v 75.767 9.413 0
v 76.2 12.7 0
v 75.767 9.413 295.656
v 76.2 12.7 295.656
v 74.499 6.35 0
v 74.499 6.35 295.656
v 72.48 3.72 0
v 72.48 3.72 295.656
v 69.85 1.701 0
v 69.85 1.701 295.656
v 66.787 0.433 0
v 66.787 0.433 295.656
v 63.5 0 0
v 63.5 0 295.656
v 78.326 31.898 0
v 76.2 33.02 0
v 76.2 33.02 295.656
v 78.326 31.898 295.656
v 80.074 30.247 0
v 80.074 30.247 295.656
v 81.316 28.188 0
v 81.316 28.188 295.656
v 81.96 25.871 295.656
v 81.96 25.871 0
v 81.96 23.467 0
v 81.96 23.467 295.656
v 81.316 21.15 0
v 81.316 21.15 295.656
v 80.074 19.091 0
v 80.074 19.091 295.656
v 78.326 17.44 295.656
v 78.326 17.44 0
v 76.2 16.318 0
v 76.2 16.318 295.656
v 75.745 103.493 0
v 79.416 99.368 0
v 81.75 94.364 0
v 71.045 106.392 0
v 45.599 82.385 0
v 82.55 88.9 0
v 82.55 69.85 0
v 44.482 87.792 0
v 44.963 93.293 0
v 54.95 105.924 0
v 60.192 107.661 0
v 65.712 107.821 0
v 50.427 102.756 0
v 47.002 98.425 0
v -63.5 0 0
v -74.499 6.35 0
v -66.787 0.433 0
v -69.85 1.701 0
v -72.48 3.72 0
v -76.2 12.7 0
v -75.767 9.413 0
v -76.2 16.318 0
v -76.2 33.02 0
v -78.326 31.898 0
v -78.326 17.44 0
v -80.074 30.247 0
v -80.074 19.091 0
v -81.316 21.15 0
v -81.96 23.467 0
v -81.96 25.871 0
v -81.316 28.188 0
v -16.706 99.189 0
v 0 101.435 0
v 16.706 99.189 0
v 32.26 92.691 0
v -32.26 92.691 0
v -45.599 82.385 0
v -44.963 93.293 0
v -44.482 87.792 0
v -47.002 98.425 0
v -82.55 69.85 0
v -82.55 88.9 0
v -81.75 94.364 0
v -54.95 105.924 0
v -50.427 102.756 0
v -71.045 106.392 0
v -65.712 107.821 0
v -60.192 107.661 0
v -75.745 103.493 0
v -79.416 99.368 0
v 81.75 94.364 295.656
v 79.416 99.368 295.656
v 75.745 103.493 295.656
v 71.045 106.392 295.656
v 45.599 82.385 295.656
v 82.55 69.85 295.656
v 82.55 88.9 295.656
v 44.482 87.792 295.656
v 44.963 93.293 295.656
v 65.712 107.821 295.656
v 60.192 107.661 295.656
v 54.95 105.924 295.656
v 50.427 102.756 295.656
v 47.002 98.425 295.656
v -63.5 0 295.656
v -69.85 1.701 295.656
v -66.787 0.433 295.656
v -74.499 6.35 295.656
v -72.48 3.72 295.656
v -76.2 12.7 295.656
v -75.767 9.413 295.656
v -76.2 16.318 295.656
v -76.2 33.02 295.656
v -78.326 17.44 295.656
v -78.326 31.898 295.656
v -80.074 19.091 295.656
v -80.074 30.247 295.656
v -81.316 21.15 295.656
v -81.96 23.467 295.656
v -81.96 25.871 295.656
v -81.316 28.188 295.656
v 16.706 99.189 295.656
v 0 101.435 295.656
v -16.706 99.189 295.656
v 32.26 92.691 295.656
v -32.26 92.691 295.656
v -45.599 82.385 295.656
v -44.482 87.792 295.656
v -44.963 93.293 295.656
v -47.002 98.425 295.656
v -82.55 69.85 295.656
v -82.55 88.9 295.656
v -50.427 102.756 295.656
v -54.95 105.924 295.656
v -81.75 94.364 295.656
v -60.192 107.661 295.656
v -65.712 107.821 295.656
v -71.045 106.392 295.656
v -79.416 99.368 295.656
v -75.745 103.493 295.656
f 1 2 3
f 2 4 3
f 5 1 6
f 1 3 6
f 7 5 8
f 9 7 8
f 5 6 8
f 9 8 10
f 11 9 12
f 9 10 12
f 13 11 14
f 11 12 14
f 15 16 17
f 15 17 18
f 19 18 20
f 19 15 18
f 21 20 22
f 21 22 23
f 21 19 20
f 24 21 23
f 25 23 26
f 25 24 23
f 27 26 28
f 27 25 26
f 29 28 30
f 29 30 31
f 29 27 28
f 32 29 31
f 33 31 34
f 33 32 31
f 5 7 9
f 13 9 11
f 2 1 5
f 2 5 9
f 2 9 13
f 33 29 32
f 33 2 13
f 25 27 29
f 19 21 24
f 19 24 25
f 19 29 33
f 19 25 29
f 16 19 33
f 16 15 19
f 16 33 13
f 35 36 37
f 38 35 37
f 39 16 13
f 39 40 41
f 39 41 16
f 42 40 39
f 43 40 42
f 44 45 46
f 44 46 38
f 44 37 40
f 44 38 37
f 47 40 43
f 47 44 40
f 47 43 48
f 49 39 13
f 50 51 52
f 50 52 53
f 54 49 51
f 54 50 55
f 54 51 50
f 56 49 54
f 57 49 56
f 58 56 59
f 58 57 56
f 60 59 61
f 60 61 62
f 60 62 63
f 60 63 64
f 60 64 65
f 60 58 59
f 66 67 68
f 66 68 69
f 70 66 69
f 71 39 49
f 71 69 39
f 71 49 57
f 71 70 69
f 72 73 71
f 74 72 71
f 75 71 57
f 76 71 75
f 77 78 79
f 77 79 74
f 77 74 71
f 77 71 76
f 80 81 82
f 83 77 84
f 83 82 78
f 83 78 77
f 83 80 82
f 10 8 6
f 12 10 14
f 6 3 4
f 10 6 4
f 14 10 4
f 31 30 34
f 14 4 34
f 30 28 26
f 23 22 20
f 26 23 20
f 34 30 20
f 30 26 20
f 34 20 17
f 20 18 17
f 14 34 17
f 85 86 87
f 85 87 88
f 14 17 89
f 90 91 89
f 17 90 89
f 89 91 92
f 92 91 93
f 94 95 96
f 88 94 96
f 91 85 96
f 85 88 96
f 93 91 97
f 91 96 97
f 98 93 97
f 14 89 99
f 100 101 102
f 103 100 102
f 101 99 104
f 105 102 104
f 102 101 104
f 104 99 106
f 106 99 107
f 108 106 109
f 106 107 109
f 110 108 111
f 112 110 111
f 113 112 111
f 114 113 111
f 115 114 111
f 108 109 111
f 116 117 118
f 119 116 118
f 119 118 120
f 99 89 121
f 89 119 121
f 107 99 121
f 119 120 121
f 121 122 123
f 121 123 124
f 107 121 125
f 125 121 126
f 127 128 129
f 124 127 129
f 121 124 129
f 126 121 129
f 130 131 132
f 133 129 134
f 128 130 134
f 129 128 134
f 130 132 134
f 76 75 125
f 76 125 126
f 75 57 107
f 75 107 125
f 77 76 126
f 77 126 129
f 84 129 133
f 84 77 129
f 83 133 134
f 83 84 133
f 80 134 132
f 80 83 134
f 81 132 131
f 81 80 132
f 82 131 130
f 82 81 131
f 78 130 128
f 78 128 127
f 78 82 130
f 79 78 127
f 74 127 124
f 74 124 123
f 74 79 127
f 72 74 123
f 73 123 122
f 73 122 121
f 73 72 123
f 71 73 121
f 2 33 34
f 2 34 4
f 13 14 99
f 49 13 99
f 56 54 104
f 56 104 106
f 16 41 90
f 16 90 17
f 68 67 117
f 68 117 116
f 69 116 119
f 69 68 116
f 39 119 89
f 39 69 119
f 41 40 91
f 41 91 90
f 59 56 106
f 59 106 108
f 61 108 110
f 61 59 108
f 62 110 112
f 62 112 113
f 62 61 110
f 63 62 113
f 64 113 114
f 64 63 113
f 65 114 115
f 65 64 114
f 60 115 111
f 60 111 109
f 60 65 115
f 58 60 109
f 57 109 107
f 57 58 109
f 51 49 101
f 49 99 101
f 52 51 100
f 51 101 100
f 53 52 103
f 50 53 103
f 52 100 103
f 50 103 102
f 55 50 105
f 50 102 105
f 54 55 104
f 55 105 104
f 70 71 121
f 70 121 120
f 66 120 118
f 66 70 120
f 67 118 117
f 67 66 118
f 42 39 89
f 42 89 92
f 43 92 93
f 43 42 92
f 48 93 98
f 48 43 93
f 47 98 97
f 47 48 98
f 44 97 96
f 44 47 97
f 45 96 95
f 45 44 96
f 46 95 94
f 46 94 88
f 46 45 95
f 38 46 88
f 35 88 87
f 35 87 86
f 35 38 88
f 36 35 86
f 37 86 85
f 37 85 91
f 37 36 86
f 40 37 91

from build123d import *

# Parameters (mm, degrees)
BOSS_EXTRUDE1_DEPTH = 295.656
FILLET1_R           = 12.7


with BuildPart() as part:
    # Sketch1 → Boss-Extrude1 (new body)
    with BuildSketch(Plane.XY):
        with BuildLine():
            Line((82.55, 88.9), (82.55, 69.85))
            Line((82.55, 69.85), (76.2, 33.02))
            ThreePointArc((76.2, 33.02), (82.042, 24.668844631), (76.2, 16.317689262))
            Line((76.2, 16.317689262), (76.2, 0))
            Line((76.2, 0), (-76.2, 0))
            Line((-76.2, 0), (-76.2, 16.317689262))
            ThreePointArc((-76.2, 16.317689262), (-82.042, 24.668844631), (-76.2, 33.02))
            Line((-76.2, 33.02), (-82.55, 69.85))
            Line((-82.55, 69.85), (-82.55, 88.9))
            ThreePointArc((-82.55, 88.9), (-60.192002215, 107.660587695), (-45.598855574, 82.38451627))
            ThreePointArc((-45.598855574, 82.38451627), (-24.696659186, 96.450806586), (0, 101.43451627))
            ThreePointArc((0, 101.43451627), (24.696659186, 96.450806586), (45.598855574, 82.38451627))
            ThreePointArc((45.598855574, 82.38451627), (60.192002215, 107.660587695), (82.55, 88.9))
        make_face()
    extrude(amount=BOSS_EXTRUDE1_DEPTH)

    # Fillet1
    fillet1_edges = [part.edges().sort_by_distance(p)[0] for p in [
        (76.2, 0, 147.828),
        (-76.2, 0, 147.828),
    ]]
    fillet(fillet1_edges, radius=FILLET1_R)


solid = part.part
